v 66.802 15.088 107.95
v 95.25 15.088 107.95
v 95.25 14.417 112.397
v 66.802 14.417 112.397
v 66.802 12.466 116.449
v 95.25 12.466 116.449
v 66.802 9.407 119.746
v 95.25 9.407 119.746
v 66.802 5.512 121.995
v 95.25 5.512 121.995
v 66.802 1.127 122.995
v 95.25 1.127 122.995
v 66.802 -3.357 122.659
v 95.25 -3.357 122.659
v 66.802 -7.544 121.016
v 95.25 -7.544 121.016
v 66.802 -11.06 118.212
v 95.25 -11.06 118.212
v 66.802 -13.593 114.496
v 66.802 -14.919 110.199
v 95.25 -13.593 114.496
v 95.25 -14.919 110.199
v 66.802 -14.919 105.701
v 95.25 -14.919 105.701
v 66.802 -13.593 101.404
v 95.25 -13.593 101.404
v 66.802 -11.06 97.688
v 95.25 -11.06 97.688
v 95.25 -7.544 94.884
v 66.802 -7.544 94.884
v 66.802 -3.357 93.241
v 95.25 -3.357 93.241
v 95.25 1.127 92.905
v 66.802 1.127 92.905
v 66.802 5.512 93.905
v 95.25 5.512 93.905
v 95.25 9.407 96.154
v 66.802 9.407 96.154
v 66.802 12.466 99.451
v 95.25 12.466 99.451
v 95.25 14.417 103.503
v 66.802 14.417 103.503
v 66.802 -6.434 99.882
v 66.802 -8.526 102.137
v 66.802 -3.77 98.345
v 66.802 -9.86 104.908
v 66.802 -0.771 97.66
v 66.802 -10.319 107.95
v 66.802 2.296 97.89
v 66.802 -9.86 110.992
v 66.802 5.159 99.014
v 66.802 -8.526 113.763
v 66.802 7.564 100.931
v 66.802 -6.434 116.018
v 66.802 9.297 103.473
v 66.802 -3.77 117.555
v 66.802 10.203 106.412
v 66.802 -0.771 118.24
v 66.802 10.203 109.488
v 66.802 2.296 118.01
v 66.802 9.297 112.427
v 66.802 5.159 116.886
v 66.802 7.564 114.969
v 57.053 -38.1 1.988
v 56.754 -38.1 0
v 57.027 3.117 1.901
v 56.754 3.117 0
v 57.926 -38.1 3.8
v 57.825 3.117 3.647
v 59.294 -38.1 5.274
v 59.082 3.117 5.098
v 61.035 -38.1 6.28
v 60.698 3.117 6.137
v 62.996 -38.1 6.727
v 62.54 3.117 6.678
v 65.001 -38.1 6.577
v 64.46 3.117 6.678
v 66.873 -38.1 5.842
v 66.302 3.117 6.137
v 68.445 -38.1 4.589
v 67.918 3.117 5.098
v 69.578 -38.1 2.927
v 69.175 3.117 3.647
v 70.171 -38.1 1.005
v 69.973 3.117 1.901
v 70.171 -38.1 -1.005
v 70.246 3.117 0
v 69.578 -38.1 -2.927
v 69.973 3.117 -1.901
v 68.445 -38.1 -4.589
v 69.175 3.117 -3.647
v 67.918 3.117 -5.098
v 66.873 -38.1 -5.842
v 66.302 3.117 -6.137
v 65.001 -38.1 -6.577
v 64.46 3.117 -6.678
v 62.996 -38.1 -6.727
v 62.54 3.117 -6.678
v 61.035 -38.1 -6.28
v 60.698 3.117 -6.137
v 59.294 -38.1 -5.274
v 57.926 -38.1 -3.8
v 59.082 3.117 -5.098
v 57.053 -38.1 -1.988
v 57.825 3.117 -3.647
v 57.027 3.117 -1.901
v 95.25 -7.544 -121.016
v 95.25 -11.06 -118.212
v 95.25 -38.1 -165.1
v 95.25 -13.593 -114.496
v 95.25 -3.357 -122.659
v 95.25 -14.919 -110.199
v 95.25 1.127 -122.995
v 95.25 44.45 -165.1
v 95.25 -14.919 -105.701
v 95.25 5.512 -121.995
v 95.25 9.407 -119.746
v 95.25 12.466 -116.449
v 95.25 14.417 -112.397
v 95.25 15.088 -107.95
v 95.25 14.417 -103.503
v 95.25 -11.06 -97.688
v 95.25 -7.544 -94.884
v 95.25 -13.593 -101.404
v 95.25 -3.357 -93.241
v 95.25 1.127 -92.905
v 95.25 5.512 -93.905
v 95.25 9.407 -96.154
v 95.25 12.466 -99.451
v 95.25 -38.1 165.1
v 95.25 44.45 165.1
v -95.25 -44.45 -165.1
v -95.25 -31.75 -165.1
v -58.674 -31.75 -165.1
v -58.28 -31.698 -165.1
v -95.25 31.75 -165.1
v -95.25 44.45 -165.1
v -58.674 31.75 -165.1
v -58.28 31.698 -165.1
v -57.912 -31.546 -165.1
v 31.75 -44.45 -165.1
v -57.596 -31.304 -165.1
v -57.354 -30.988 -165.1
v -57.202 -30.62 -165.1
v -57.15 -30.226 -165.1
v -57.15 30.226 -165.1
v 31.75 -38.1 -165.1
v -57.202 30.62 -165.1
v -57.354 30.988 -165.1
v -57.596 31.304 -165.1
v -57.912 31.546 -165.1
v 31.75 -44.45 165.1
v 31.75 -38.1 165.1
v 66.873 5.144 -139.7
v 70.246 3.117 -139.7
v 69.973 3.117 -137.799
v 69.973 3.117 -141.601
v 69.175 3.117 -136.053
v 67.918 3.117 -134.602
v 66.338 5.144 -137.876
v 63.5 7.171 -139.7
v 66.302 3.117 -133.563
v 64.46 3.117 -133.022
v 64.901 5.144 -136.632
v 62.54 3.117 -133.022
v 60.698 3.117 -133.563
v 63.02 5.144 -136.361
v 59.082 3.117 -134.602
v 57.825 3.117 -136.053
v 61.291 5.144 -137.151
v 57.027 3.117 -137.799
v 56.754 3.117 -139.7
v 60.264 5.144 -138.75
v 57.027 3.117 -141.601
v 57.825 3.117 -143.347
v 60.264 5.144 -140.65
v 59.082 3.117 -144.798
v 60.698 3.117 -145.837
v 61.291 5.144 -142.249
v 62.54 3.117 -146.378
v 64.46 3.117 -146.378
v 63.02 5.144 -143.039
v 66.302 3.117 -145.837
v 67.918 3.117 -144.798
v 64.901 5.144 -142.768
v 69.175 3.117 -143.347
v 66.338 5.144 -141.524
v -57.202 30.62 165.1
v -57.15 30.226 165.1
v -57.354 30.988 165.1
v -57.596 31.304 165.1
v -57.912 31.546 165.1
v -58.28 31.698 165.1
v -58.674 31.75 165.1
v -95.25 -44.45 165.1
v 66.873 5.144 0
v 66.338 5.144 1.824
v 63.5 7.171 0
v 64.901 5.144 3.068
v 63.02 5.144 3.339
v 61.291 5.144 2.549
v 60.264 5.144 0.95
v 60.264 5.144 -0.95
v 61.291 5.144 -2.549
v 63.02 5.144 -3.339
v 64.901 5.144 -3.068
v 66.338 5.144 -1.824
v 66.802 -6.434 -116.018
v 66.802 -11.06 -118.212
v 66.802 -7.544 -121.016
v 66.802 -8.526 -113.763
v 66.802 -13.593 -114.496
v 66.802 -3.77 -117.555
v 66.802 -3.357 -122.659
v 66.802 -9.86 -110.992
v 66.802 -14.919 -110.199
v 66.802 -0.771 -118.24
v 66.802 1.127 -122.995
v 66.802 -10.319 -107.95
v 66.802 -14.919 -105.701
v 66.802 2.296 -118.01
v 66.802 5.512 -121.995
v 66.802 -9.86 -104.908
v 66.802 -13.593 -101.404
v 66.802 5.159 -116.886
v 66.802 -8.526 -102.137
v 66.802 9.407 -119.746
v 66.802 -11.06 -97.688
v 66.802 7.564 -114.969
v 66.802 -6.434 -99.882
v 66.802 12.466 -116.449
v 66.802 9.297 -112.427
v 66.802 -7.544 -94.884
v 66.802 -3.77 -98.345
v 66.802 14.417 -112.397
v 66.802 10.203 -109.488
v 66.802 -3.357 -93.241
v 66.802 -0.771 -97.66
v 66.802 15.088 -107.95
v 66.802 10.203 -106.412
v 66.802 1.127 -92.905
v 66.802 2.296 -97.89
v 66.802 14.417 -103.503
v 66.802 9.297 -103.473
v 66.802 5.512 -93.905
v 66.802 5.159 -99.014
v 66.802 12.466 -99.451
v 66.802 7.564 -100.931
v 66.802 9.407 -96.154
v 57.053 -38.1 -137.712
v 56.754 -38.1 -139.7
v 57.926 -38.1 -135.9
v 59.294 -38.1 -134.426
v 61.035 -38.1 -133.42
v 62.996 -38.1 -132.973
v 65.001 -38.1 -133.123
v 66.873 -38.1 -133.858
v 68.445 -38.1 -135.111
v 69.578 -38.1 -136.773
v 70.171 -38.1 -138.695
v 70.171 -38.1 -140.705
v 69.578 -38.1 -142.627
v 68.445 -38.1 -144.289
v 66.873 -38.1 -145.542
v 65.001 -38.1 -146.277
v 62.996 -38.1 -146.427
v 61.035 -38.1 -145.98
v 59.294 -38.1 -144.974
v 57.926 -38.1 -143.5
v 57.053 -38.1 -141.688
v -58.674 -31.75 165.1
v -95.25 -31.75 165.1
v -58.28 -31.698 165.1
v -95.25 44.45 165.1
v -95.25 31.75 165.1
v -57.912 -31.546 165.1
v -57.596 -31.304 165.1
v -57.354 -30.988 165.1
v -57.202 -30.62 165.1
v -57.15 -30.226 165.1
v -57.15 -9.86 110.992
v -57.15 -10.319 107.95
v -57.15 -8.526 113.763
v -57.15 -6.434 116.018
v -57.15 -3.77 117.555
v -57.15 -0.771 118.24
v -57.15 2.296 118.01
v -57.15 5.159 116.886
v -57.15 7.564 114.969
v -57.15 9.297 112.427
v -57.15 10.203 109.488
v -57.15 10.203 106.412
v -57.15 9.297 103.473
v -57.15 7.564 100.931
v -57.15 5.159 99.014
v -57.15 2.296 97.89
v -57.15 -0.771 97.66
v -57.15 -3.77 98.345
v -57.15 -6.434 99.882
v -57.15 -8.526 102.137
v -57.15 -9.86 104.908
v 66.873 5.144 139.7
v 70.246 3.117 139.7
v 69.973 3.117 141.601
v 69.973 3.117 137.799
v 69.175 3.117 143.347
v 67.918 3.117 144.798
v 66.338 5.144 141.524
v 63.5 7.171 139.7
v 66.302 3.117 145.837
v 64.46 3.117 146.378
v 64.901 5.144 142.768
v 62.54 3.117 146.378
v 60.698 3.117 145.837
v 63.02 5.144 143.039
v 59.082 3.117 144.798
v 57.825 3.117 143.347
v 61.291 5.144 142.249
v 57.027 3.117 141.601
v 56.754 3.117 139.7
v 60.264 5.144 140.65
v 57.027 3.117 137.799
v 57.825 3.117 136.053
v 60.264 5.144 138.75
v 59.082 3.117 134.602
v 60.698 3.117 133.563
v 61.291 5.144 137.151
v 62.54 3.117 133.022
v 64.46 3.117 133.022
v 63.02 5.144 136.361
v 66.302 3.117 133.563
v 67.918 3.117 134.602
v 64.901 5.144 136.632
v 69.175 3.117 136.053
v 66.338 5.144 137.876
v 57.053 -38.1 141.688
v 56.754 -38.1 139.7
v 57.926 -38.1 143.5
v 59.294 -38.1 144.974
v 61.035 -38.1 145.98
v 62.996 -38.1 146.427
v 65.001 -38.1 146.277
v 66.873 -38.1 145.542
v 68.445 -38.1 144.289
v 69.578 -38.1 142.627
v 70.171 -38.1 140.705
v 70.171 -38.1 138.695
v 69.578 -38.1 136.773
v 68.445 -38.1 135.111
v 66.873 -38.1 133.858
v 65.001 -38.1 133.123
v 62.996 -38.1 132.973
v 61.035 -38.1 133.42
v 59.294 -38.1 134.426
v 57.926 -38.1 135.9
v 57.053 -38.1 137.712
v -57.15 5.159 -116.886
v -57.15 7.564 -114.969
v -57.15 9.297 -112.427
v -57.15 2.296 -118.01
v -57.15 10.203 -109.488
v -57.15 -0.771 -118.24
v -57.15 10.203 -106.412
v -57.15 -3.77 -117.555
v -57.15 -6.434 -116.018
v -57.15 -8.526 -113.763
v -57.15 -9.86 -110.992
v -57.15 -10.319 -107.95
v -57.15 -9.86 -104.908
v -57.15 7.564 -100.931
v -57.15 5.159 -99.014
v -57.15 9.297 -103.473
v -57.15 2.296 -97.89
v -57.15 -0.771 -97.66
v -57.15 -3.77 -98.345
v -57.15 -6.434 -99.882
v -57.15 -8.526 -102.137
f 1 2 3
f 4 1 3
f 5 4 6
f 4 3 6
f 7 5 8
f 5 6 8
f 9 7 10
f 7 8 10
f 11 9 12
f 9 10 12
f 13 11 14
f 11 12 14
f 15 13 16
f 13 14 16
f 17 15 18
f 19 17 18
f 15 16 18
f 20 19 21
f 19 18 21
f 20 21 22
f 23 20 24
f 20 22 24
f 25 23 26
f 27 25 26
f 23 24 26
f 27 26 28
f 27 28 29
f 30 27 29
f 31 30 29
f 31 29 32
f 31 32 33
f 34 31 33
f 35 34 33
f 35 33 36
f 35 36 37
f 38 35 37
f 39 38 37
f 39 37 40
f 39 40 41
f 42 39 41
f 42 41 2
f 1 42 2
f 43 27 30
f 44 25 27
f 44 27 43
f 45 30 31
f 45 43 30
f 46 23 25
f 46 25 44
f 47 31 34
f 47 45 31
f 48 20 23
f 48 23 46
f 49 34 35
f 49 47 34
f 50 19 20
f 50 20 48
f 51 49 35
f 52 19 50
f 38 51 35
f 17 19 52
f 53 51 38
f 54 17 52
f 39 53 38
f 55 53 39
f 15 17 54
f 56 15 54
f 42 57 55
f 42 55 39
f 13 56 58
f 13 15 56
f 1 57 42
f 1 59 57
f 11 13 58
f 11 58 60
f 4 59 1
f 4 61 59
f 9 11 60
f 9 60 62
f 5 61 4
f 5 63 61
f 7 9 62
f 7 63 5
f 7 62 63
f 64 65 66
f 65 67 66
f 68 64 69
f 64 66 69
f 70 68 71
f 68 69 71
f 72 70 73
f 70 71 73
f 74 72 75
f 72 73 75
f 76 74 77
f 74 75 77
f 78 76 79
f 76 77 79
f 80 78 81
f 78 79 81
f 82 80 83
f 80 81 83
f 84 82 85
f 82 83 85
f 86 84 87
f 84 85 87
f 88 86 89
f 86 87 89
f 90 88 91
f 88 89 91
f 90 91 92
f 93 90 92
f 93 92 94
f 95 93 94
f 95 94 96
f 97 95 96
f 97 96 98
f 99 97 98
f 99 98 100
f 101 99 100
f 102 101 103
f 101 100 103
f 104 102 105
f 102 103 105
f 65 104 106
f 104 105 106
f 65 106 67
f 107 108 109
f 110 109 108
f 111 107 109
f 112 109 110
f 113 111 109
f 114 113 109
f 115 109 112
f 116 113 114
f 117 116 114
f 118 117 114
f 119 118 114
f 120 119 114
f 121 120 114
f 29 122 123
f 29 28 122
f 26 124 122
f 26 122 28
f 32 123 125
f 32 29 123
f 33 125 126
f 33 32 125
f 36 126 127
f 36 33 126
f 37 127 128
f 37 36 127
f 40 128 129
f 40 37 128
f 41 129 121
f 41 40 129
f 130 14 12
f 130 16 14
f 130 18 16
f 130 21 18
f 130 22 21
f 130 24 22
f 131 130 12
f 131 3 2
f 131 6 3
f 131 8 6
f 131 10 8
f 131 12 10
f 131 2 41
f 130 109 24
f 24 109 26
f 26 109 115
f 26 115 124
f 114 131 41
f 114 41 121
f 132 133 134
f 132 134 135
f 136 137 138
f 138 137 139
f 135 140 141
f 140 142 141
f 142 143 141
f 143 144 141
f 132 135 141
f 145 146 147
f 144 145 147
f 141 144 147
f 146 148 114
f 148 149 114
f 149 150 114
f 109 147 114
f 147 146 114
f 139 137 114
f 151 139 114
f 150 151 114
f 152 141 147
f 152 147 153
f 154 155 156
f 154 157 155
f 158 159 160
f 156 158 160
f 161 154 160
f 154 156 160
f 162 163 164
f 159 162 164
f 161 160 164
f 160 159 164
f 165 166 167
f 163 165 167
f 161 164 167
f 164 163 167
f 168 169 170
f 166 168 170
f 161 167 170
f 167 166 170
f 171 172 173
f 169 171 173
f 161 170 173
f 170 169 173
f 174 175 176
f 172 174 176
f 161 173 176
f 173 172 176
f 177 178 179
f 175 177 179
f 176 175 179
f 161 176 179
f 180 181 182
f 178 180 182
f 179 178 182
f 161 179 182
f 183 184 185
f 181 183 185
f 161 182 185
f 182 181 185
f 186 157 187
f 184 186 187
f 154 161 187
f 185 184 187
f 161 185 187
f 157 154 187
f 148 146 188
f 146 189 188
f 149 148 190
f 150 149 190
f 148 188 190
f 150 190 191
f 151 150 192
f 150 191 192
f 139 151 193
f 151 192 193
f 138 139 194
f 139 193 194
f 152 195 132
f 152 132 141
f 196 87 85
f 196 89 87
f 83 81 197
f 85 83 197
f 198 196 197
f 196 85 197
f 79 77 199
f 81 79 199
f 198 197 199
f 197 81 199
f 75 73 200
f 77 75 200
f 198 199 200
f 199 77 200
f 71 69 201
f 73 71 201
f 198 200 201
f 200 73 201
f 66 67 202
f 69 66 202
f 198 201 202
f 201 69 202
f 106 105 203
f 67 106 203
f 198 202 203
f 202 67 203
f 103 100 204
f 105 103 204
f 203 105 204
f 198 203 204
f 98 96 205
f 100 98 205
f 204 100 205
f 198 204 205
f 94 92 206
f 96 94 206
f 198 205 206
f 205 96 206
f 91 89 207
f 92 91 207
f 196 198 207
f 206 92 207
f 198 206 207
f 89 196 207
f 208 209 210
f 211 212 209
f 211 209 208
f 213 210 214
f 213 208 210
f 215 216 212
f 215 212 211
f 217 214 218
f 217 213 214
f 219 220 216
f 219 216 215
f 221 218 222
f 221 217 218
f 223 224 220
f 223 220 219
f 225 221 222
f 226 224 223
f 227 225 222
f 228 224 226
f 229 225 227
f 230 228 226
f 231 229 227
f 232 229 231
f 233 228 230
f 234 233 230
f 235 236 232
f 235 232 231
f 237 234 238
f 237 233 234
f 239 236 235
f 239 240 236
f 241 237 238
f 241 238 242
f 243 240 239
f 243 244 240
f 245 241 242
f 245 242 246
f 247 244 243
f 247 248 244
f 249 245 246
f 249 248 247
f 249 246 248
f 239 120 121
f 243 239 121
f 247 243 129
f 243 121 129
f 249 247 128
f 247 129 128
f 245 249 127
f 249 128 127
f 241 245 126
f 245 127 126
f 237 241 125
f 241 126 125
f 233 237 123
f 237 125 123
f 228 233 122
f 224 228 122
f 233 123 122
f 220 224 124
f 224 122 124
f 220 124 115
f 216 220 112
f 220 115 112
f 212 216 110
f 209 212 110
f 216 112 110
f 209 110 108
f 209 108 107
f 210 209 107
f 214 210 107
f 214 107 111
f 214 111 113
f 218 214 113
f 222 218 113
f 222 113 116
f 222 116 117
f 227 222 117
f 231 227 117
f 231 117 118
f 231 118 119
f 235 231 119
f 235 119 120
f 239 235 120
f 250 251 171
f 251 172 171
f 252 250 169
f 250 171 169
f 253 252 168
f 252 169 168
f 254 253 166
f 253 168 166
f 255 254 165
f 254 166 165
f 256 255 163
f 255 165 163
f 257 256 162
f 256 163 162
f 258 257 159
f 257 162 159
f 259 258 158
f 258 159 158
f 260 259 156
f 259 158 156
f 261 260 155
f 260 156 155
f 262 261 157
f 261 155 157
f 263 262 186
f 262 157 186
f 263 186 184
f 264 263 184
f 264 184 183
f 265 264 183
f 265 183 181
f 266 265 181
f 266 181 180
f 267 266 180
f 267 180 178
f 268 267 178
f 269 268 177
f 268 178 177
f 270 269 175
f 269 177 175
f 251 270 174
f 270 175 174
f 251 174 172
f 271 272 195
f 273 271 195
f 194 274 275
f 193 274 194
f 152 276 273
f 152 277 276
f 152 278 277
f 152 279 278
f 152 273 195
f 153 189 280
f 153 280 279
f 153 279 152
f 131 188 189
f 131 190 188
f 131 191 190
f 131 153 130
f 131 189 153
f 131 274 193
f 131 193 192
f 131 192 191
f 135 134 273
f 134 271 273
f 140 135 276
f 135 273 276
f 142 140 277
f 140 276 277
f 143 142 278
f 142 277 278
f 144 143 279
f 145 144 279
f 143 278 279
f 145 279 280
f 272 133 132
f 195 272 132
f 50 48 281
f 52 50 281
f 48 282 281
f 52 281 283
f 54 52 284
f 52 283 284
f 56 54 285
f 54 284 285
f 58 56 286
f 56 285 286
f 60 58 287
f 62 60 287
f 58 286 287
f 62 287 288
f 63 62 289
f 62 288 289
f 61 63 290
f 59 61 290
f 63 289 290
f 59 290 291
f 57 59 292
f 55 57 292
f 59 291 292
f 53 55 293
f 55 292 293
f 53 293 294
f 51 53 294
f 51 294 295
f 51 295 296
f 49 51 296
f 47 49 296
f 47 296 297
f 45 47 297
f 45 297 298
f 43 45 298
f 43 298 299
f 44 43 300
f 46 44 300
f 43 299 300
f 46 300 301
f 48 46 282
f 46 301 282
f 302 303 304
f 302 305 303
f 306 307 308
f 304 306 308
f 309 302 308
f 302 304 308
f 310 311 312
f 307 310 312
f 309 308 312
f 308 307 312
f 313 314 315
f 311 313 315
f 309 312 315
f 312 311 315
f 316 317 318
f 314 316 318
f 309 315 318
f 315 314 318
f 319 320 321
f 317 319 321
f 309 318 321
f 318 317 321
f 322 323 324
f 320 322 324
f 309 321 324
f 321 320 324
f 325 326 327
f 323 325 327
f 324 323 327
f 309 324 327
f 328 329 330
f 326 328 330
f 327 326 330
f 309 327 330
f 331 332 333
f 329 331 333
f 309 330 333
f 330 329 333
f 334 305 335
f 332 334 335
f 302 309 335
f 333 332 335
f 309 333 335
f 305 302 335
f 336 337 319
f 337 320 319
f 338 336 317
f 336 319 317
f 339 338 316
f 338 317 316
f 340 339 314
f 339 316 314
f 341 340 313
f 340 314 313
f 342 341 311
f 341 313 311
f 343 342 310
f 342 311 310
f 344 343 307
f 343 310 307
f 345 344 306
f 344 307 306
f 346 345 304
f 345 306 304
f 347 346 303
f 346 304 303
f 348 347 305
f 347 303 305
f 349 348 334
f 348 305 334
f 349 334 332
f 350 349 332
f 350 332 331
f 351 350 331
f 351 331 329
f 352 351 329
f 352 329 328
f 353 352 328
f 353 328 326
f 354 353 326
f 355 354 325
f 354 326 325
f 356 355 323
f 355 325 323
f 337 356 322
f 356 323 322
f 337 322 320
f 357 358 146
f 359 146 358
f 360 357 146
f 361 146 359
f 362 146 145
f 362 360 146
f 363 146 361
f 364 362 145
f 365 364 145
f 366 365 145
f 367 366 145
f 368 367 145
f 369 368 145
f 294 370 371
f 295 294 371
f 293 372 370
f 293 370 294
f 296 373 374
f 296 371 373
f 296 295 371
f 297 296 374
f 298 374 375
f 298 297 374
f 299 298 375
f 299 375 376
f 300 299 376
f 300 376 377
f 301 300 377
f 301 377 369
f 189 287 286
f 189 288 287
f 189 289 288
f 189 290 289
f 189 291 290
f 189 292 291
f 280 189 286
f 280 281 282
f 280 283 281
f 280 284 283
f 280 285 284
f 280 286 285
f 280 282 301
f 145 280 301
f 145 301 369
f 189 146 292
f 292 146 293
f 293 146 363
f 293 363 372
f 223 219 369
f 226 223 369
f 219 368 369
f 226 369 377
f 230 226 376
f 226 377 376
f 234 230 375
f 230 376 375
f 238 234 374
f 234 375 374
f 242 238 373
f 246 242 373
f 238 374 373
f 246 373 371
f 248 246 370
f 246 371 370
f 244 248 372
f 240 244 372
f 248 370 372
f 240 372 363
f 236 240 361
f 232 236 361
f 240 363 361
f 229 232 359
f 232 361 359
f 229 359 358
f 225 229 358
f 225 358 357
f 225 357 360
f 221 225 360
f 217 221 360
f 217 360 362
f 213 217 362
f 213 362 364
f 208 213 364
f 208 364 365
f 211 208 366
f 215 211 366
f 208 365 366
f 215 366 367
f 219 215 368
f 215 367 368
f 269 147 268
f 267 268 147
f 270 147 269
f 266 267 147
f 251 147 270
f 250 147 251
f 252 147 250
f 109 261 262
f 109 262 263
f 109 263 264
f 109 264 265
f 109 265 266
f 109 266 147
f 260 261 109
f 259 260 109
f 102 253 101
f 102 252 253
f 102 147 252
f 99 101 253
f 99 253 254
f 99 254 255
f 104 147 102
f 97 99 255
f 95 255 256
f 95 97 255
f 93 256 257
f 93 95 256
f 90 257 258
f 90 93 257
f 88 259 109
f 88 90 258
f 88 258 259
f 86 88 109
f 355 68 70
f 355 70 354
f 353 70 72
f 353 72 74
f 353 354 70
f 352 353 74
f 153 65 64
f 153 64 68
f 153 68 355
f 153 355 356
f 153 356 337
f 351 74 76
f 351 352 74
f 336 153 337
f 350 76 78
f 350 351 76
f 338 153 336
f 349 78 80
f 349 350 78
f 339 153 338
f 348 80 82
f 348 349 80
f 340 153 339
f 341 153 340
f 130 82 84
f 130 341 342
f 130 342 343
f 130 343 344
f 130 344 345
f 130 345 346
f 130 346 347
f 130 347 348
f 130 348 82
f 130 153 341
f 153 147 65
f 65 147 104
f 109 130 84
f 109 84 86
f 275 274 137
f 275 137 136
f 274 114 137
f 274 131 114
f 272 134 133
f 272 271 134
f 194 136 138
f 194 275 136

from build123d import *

# Parameters (mm, degrees)
F1_DEPTH       = 165.1
F2_R           = 1.524
F4_D           = 20.6375
F4_CBORE_D     = 30.1752
F4_CBORE_DEPTH = 28.448
F5_W           = 63.5
F5_H           = 330.2
F6_DEPTH       = 6.35
F8_D           = 13.49248
F8_DEPTH       = 41.2172727273
F8_TIP         = 4.0535499425


# Not quite as in the source:
# - a length typed as a fraction of an inch, garbled in the dataset ("3 / 203.2 mm" for 3/8 in), is restored


with BuildPart() as f1:
    # F0 (on Top) → F1 (new body, symmetric)
    with BuildSketch(Plane.XY):
        Polygon((95.25, 44.45), (-95.25, 44.45), (-95.25, 31.75), (-57.15, 31.75), (-57.15, -31.75), (-95.25, -31.75), (-95.25, -44.45), (95.25, -44.45), align=None)
    extrude(amount=F1_DEPTH, both=True)

    # F2
    f2_edges = [f1.edges().sort_by_distance(p)[0] for p in [
        (-57.15, 31.75, 0),
        (-57.15, -31.75, 0),
    ]]
    fillet(f2_edges, radius=F2_R)

    # F4 (through all)
    with Locations(Plane.YZ.offset(95.25)):
        with Locations((0, 107.95), (0, -107.95)):
            CounterBoreHole(F4_D / 2, F4_CBORE_D / 2, F4_CBORE_DEPTH)

    # F5 (on face) → F6 (cut)
    with BuildSketch(Plane.XZ.offset(44.45)):
        with Locations((63.5, 0)):
            Rectangle(F5_W, F5_H)
    extrude(amount=-F6_DEPTH, mode=Mode.SUBTRACT)

    # F8
    with Locations(Plane.XZ.offset(38.1)):
        with Locations((63.5, 139.7), (63.5, 0), (63.5, -139.7)):
            Hole(F8_D / 2, depth=F8_DEPTH)
            with Locations((0, 0, -(F8_DEPTH + F8_TIP / 2))):  # 118° drill point
                Cone(0, F8_D / 2, F8_TIP, mode=Mode.SUBTRACT)


solid = f1.part
